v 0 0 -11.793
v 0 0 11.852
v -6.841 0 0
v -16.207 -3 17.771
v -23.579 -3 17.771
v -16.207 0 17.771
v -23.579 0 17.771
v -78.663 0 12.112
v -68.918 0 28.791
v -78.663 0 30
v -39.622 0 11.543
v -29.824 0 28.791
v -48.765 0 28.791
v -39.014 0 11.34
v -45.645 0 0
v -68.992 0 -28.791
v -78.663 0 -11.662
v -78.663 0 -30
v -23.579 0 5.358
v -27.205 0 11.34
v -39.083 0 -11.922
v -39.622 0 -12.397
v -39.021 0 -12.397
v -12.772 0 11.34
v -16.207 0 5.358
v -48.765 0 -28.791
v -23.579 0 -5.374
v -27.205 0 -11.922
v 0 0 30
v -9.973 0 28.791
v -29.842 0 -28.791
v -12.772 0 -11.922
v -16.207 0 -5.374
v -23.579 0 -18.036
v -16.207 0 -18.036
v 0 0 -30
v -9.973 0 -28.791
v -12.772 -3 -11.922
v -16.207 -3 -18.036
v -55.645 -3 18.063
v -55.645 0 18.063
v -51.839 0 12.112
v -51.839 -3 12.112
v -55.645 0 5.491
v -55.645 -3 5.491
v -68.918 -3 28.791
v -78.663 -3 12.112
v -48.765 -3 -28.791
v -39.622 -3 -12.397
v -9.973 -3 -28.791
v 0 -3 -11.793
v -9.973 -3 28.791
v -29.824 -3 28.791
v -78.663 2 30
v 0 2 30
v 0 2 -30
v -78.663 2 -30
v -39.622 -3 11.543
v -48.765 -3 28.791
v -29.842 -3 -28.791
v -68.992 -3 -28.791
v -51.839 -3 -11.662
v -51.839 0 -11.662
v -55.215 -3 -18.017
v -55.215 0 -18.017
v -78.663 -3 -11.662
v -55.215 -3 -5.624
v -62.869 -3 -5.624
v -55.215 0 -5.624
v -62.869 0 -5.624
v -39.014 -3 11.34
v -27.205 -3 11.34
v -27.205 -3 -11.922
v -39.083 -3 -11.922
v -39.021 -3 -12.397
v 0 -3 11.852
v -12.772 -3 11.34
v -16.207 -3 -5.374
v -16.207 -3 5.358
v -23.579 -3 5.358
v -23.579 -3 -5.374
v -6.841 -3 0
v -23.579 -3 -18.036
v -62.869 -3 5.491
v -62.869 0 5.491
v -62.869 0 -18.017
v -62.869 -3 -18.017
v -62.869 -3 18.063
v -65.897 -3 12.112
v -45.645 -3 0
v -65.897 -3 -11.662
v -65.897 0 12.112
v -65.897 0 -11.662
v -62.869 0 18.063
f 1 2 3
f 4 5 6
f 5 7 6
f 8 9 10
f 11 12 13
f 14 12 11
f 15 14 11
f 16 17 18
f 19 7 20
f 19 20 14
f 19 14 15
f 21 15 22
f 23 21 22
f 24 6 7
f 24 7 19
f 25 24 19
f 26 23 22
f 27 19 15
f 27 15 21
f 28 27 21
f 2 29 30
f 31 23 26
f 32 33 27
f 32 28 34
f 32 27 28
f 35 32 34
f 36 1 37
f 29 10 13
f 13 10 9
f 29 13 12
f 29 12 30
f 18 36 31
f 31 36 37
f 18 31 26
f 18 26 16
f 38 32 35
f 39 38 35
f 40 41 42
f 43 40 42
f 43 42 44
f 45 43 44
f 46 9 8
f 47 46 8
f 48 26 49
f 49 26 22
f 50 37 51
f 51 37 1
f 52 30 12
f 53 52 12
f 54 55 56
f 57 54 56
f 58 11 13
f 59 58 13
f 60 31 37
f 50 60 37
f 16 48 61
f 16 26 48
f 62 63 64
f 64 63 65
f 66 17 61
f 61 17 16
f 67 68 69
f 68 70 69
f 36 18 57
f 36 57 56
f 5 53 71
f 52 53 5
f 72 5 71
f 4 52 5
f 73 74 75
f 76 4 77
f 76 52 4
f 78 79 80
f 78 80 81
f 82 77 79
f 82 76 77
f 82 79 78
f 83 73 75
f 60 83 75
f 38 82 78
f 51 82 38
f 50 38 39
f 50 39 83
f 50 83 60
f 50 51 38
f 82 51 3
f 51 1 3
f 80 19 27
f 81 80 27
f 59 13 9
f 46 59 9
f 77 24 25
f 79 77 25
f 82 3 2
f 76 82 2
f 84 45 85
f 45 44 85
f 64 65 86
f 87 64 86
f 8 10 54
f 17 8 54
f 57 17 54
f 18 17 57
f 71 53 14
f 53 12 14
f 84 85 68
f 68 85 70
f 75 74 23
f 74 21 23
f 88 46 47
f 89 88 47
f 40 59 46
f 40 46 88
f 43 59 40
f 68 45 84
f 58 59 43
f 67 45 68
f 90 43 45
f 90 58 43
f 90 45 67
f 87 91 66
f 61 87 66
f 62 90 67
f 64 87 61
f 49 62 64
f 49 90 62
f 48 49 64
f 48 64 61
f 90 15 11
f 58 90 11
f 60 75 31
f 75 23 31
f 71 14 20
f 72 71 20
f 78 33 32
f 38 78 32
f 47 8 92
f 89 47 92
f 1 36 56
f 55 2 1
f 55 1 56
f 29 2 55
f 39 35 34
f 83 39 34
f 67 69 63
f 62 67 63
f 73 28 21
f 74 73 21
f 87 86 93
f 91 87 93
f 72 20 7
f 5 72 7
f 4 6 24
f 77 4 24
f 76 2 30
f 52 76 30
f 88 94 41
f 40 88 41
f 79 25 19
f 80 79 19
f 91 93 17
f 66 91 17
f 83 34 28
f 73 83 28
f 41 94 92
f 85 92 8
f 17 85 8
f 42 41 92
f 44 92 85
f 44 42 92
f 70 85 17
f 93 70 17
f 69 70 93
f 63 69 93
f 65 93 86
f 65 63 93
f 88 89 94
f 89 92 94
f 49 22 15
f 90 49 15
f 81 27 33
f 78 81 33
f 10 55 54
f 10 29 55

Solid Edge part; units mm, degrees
sketch "Sketch1" plane through (0, 0, 0) normal (0, -1, 0) x (1, 0, 0)
  line L0 (-100, -30) -> (100, -30)
  line L1 (100, -30) -> (100, 30)
  line L2 (100, 30) -> (-100, 30)
  line L3 (-100, 30) -> (-100, -30)
  dimension "D1" = 200
  dimension "D2" = 60
extrude "Protrusion1" add sketch "Sketch1" against normal blind 2
sketch "Sketch2" plane through (0, 0, 0) normal (0, -1, 0) x (1, 0, 0)
  line L0 (-39.6222, 11.5432) -> (-48.7647, 28.7907)
  line L1 (-48.7647, 28.7907) -> (-68.9181, 28.7907)
  line L2 (-68.9181, 28.7907) -> (-78.6631, 12.1124)
  line L3 (-78.6631, 12.1124) -> (-65.8971, 12.1124)
  line L4 (-65.8971, 12.1124) -> (-62.8688, 18.0634)
  line L5 (-62.8688, 18.0634) -> (-55.6447, 18.0634)
  line L6 (-55.6447, 18.0634) -> (-51.8394, 12.1124)
  line L7 (-51.8394, 12.1124) -> (-55.6447, 5.4911)
  line L8 (-55.6447, 5.4911) -> (-62.8688, 5.4911)
  line L9 (-62.8688, 5.4911) -> (-62.8688, -5.6236)
  line L10 (-62.8688, -5.6236) -> (-55.2147, -5.6236)
  line L11 (-55.2147, -5.6236) -> (-51.8394, -11.6625)
  line L12 (-51.8394, -11.6625) -> (-55.2147, -18.0171)
  line L13 (-55.2147, -18.0171) -> (-62.8688, -18.0171)
  line L14 (-62.8688, -18.0171) -> (-65.8971, -11.6625)
  line L15 (-65.8971, -11.6625) -> (-78.6631, -11.6625)
  line L16 (-78.6631, -11.6625) -> (-68.9922, -28.7907)
  line L17 (-48.7647, -28.7907) -> (-68.9922, -28.7907)
  line L18 (-48.7647, -28.7907) -> (-39.6222, -12.3974)
  line L19 (-39.6222, -12.3974) -> (-45.6448, 0)
  line L20 (-45.6448, 0) -> (-39.6222, 11.5432)
  line L21 (-29.8239, 28.7907) -> (-39.0136, 11.3404)
  line L22 (-39.0136, 11.3404) -> (-27.2051, 11.3404)
  line L23 (-27.2051, 11.3404) -> (-23.5794, 17.7709)
  line L24 (-23.5794, 17.7709) -> (-16.2069, 17.7709)
  line L25 (-16.2069, 17.7709) -> (-12.7725, 11.3404)
  line L26 (-12.7725, 11.3404) -> (-16.2069, 5.3584)
  line L27 (-16.2069, 5.3584) -> (-23.5794, 5.3584)
  line L28 (-23.5794, 5.3584) -> (-23.5794, -5.3744)
  line L29 (-23.5794, -5.3744) -> (-16.2069, -5.3744)
  line L30 (-16.2069, -5.3744) -> (-12.7725, -11.9215)
  line L31 (-12.7725, -11.9215) -> (-16.2069, -18.0364)
  line L32 (-16.2069, -18.0364) -> (-23.5794, -18.0364)
  line L33 (-23.5794, -18.0364) -> (-27.2051, -11.9215)
  line L34 (-27.2051, -11.9215) -> (-39.0832, -11.9215)
  line L35 (-39.0832, -11.9215) -> (-39.0211, -12.3974)
  line L36 (-39.0211, -12.3974) -> (-29.8416, -28.7907)
  line L37 (-29.8416, -28.7907) -> (-9.9734, -28.7907)
  line L38 (-9.9734, -28.7907) -> (0, -11.7929)
  line L39 (0, -11.7929) -> (-6.8407, 0)
  line L40 (-6.8407, 0) -> (0, 11.8515)
  line L41 (0, 11.8515) -> (-9.9734, 28.7907)
  line L42 (-9.9734, 28.7907) -> (-29.8239, 28.7907)
  line L43 (9.4303, 28.7907) -> (0, 12.3815)
  line L44 (0, 12.3815) -> (0.2872, 11.8515)
  line L45 (0.2872, 11.8515) -> (12.5492, 11.8515)
  line L46 (12.5492, 11.8515) -> (15.7991, 18.0247)
  line L47 (15.7991, 18.0247) -> (23.265, 18.0247)
  line L48 (23.265, 18.0247) -> (26.8369, 11.8515)
  line L49 (26.8369, 11.8515) -> (23.265, 5.318)
  line L50 (23.265, 5.318) -> (15.7991, 5.318)
  line L51 (15.7991, 5.318) -> (15.7991, -5.632)
  line L52 (15.7991, -5.632) -> (23.265, -5.632)
  line L53 (23.265, -5.632) -> (26.7839, -11.7003)
  line L54 (26.7839, -11.7003) -> (23.265, -17.8487)
  line L55 (23.265, -17.8487) -> (15.768, -17.8487)
  line L56 (15.768, -17.8487) -> (12.2913, -11.7003)
  line L57 (0.3007, -11.6312) -> (12.2913, -11.7003)
  line L58 (0, -12.7084) -> (0.3007, -11.6312)
  line L59 (0, -12.7084) -> (9.391, -28.7907)
  line L60 (9.391, -28.7907) -> (29.5768, -28.7907)
  line L61 (29.5768, -28.7907) -> (39.4696, -11.7929)
  line L62 (39.4696, -11.7929) -> (32.5504, 0)
  line L63 (39.014, 12.1809) -> (32.5504, 0)
  line L64 (29.5768, 28.7907) -> (39.014, 12.1809)
  line L65 (29.5768, 28.7907) -> (9.4303, 28.7907)
  line L66 (39.3531, 11.3913) -> (49.0927, 28.7907)
  line L67 (68.964, 28.7907) -> (49.0927, 28.7907)
  line L68 (78.6631, 11.3946) -> (68.964, 28.7907)
  line L69 (55.3829, -28.7907) -> (78.6631, 11.3946)
  line L70 (42.8739, -28.7907) -> (55.3829, -28.7907)
  line L71 (56.0977, -5.4746) -> (42.8739, -28.7907)
  line L72 (49.0927, -5.4746) -> (56.0977, -5.4746)
  line L73 (49.0927, -5.4746) -> (39.3531, 11.3913)
  line L74 (51.7218, 11.7746) -> (55.3868, 5.6144)
  line L75 (55.3868, 5.6144) -> (62.6387, 5.6144)
  line L76 (62.6387, 5.6144) -> (66.3037, 11.7746)
  line L77 (66.3037, 11.7746) -> (62.6387, 17.9349)
  line L78 (62.6387, 17.9349) -> (55.3868, 17.9349)
  line L79 (55.3868, 17.9349) -> (51.7218, 11.7746)
extrude "ExtrudedProtrusion_3" add sketch "Sketch2" along normal blind 3
sketch "Sketch3" plane through (0, 0, 0) normal (0, -1, 0) x (1, 0, 0)
  line L0 (0, -30) -> (0, 30)
  line L1 (0, 30) -> (100, 30)
  line L2 (100, 30) -> (100, -30)
  line L3 (100, -30) -> (0, -30)
  line L4 (-78.6631, 30) -> (-78.6631, -30)
  line L5 (-78.6631, -30) -> (-100, -30)
  line L6 (-100, -30) -> (-100, 30)
  line L7 (-100, 30) -> (-78.6631, 30)
extrude "ExtrudedCutout_1" cut sketch "Sketch3" along normal blind 14.3776
sketch "Sketch4" plane through (0, 0, 0) normal (0, -1, 0) x (1, 0, 0)
  line L0 (0, 30) -> (100, 30)
  line L1 (100, 30) -> (100, -30)
  line L2 (100, -30) -> (0, -30)
  line L3 (0, -30) -> (0, 30)
  line L4 (-100, 30) -> (-78.6631, 30)
  line L5 (-78.6631, 30) -> (-78.6631, -30)
  line L6 (-78.6631, -30) -> (-100, -30)
  line L7 (-100, -30) -> (-100, 30)
extrude "ExtrudedCutout_2" cut sketch "Sketch4" against normal blind 57.8718
properties part number "BumbleB0911"
